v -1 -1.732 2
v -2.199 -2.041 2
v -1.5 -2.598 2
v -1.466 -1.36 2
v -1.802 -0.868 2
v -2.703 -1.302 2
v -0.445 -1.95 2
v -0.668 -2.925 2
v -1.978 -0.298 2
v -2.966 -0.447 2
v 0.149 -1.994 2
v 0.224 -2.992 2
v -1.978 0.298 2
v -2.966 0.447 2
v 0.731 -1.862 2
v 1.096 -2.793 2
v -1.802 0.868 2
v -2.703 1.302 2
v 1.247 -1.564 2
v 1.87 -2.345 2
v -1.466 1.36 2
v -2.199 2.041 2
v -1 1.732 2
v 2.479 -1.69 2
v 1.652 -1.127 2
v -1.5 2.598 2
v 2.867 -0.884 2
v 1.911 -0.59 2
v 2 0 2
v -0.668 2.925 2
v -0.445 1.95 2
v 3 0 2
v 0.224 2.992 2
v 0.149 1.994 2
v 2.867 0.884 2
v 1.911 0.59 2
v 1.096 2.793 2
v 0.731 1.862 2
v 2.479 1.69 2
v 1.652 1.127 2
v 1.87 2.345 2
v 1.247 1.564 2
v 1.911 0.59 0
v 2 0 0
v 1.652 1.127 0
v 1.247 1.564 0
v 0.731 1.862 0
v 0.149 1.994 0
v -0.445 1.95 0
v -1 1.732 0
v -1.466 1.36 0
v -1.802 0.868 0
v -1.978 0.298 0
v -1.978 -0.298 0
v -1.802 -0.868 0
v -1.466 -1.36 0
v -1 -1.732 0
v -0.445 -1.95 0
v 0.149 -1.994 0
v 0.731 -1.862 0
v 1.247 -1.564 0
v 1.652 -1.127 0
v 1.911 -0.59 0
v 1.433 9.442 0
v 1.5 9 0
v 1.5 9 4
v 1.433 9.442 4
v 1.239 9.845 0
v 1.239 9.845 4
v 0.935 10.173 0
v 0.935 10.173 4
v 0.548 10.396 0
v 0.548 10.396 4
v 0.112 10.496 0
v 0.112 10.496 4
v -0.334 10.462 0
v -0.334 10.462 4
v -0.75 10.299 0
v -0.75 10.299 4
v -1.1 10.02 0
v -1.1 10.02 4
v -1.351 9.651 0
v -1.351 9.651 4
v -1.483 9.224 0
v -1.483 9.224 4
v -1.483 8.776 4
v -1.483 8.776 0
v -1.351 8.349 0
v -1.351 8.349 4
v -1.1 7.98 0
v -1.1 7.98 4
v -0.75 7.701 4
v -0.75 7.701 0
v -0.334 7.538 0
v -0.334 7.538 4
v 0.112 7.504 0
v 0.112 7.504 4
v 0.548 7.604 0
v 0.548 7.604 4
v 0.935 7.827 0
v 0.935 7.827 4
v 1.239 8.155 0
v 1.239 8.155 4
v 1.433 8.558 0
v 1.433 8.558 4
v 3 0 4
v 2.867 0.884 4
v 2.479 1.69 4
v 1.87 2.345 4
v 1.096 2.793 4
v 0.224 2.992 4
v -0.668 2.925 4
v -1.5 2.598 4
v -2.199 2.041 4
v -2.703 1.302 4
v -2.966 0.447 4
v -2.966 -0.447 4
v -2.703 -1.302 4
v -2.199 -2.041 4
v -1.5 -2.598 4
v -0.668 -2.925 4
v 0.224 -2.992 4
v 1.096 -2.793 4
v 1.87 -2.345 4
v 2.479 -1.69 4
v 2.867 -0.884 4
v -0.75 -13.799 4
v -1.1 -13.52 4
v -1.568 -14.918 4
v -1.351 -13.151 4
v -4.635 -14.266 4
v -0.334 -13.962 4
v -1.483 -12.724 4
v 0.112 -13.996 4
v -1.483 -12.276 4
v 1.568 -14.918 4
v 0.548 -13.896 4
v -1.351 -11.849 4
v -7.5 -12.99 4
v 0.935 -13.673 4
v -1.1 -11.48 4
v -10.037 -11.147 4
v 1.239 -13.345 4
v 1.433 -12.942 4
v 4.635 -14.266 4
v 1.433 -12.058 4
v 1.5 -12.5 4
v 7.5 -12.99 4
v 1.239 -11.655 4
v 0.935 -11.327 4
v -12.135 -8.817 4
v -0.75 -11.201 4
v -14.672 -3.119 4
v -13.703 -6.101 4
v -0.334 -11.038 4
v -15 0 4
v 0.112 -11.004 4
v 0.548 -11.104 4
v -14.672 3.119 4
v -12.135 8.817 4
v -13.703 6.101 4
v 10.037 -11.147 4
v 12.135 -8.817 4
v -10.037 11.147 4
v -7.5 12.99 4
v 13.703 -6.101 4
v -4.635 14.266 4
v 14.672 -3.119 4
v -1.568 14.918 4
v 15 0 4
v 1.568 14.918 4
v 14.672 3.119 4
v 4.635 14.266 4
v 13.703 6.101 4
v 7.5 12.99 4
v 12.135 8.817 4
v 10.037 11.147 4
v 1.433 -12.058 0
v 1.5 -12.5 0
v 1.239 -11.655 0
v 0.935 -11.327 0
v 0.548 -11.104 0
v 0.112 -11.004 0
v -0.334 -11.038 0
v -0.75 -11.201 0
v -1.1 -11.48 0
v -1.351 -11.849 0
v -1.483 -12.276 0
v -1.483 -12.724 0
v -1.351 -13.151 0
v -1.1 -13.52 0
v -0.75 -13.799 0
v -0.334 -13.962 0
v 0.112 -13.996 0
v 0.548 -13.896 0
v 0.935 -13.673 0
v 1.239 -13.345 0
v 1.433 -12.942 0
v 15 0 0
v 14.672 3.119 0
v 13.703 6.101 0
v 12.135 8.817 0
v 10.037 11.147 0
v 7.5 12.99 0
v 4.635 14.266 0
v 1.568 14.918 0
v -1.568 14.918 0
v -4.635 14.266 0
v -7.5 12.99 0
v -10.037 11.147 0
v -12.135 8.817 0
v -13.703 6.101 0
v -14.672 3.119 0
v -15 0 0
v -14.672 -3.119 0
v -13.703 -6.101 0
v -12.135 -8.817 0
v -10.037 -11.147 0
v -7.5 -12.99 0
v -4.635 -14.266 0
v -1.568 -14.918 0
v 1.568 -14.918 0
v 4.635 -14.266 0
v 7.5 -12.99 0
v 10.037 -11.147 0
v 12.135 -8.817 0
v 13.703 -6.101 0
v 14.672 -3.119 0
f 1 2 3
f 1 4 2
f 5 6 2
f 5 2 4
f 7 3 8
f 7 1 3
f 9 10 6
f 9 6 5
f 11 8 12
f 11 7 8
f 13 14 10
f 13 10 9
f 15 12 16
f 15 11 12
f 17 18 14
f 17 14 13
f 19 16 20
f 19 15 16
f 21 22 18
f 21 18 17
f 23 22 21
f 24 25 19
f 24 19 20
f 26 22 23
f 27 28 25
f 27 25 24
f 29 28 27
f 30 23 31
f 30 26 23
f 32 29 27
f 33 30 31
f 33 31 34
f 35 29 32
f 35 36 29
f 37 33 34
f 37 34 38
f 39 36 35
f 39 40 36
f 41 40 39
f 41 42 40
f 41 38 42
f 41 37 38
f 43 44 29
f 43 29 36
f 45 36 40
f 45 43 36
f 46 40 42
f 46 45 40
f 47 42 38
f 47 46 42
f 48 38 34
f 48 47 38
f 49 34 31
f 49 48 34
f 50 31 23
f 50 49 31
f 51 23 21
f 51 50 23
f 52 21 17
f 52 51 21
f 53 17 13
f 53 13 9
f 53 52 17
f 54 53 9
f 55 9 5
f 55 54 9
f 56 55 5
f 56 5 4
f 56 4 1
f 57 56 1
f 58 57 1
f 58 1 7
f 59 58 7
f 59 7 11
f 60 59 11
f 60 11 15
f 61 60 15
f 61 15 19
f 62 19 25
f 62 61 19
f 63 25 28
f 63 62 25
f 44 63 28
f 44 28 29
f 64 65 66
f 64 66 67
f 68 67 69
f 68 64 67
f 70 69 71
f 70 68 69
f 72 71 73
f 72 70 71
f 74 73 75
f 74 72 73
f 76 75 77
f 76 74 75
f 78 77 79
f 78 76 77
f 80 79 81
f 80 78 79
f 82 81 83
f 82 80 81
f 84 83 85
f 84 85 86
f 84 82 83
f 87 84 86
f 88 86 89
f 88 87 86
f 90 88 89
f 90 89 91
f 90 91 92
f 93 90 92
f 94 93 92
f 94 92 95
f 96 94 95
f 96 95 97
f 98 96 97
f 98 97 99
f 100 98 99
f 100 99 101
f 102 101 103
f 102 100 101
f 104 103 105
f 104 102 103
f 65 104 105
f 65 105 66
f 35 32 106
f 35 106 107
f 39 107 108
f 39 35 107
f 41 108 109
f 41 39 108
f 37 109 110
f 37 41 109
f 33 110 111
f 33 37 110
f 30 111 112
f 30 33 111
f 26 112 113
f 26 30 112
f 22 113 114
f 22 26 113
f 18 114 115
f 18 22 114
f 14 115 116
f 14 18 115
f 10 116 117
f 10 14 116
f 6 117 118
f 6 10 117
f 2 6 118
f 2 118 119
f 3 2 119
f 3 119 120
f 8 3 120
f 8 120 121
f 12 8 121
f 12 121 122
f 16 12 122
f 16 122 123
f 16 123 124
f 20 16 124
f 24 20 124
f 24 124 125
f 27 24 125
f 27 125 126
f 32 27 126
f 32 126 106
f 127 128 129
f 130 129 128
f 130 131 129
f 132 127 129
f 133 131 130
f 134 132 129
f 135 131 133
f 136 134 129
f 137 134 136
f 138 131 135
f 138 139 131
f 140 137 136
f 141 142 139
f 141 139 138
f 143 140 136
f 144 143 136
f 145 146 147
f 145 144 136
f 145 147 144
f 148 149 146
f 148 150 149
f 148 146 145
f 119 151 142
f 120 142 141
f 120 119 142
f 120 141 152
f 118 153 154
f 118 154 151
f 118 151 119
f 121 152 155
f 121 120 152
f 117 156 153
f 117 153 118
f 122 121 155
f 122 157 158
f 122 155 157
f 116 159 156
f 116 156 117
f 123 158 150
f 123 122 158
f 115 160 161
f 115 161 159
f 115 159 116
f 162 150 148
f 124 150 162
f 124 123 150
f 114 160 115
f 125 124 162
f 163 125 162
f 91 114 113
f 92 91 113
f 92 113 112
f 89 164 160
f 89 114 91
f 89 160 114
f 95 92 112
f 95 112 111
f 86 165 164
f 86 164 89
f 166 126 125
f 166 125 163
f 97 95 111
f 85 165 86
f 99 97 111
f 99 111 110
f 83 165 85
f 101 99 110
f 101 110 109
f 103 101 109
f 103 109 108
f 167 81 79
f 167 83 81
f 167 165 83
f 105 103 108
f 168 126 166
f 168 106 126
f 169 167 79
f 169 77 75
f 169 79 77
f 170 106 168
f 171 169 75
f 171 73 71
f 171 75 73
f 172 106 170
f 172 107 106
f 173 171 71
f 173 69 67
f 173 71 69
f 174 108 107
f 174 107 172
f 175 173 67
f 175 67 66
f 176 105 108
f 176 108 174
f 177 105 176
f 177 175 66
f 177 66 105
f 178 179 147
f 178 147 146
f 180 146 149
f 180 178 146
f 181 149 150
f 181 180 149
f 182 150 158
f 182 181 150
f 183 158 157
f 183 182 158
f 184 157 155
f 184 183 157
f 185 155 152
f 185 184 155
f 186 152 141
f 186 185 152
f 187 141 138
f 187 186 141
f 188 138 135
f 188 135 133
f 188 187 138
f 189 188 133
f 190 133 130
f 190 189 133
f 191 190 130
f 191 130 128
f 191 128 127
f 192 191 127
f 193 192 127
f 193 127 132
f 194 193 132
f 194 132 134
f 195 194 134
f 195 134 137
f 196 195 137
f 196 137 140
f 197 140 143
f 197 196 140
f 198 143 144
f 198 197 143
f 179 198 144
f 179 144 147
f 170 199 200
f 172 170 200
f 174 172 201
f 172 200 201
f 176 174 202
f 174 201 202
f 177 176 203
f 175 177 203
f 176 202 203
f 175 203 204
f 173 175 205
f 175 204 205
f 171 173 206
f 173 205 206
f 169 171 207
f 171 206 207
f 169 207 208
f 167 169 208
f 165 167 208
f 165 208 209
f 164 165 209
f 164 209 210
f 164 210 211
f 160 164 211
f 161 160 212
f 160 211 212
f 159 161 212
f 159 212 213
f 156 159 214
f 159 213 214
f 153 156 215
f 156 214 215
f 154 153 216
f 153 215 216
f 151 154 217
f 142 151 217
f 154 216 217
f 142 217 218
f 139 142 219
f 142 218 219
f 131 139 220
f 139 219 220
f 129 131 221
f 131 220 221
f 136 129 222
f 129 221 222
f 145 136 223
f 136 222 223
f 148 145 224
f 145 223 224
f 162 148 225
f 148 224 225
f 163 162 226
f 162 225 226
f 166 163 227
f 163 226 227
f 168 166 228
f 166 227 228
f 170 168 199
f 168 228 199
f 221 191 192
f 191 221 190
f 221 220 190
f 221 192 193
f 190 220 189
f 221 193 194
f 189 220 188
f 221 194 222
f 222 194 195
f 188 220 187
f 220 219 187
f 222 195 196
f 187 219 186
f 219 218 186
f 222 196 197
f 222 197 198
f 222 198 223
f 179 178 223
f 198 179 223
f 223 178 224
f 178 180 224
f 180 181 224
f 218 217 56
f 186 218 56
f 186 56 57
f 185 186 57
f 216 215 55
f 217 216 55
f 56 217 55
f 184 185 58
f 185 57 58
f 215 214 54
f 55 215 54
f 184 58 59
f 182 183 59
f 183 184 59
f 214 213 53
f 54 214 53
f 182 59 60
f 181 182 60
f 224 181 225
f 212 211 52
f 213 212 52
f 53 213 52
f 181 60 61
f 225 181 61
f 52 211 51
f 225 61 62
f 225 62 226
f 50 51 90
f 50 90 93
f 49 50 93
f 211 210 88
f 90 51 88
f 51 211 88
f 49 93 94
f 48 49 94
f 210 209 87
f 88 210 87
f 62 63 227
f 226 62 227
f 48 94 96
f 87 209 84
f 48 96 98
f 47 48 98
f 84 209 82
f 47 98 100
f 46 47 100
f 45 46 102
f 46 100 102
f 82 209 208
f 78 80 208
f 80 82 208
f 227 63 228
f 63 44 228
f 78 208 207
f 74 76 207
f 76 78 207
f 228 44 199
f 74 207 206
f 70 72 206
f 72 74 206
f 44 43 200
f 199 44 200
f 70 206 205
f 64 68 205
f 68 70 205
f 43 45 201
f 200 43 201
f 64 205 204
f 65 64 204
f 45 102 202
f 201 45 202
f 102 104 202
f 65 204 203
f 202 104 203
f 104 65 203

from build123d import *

# Parameters (mm, degrees)
SKETCH1_R           = 15
SKETCH1_R_2         = 1.5
SKETCH1_R_3         = 3
BOSS_EXTRUDE1_DEPTH = 4
SKETCH1_3_R         = 3
SKETCH1_3_R_2       = 2
BOSS_EXTRUDE2_DEPTH = 2


with BuildPart() as part:
    # Sketch1 → Boss-Extrude1 (new body)
    with BuildSketch(Plane.XY):
        Circle(SKETCH1_R)
        with Locations((0, -12.5)):
            Circle(SKETCH1_R_2, mode=Mode.SUBTRACT)
        Circle(SKETCH1_R_3, mode=Mode.SUBTRACT)
        with Locations((0, 9)):
            Circle(SKETCH1_R_2, mode=Mode.SUBTRACT)
    extrude(amount=BOSS_EXTRUDE1_DEPTH)

    # Sketch1<3> → Boss-Extrude2 (add)
    with BuildSketch(Plane.XY):
        Circle(SKETCH1_3_R)
        Circle(SKETCH1_3_R_2, mode=Mode.SUBTRACT)
    extrude(amount=BOSS_EXTRUDE2_DEPTH)


solid = part.part
